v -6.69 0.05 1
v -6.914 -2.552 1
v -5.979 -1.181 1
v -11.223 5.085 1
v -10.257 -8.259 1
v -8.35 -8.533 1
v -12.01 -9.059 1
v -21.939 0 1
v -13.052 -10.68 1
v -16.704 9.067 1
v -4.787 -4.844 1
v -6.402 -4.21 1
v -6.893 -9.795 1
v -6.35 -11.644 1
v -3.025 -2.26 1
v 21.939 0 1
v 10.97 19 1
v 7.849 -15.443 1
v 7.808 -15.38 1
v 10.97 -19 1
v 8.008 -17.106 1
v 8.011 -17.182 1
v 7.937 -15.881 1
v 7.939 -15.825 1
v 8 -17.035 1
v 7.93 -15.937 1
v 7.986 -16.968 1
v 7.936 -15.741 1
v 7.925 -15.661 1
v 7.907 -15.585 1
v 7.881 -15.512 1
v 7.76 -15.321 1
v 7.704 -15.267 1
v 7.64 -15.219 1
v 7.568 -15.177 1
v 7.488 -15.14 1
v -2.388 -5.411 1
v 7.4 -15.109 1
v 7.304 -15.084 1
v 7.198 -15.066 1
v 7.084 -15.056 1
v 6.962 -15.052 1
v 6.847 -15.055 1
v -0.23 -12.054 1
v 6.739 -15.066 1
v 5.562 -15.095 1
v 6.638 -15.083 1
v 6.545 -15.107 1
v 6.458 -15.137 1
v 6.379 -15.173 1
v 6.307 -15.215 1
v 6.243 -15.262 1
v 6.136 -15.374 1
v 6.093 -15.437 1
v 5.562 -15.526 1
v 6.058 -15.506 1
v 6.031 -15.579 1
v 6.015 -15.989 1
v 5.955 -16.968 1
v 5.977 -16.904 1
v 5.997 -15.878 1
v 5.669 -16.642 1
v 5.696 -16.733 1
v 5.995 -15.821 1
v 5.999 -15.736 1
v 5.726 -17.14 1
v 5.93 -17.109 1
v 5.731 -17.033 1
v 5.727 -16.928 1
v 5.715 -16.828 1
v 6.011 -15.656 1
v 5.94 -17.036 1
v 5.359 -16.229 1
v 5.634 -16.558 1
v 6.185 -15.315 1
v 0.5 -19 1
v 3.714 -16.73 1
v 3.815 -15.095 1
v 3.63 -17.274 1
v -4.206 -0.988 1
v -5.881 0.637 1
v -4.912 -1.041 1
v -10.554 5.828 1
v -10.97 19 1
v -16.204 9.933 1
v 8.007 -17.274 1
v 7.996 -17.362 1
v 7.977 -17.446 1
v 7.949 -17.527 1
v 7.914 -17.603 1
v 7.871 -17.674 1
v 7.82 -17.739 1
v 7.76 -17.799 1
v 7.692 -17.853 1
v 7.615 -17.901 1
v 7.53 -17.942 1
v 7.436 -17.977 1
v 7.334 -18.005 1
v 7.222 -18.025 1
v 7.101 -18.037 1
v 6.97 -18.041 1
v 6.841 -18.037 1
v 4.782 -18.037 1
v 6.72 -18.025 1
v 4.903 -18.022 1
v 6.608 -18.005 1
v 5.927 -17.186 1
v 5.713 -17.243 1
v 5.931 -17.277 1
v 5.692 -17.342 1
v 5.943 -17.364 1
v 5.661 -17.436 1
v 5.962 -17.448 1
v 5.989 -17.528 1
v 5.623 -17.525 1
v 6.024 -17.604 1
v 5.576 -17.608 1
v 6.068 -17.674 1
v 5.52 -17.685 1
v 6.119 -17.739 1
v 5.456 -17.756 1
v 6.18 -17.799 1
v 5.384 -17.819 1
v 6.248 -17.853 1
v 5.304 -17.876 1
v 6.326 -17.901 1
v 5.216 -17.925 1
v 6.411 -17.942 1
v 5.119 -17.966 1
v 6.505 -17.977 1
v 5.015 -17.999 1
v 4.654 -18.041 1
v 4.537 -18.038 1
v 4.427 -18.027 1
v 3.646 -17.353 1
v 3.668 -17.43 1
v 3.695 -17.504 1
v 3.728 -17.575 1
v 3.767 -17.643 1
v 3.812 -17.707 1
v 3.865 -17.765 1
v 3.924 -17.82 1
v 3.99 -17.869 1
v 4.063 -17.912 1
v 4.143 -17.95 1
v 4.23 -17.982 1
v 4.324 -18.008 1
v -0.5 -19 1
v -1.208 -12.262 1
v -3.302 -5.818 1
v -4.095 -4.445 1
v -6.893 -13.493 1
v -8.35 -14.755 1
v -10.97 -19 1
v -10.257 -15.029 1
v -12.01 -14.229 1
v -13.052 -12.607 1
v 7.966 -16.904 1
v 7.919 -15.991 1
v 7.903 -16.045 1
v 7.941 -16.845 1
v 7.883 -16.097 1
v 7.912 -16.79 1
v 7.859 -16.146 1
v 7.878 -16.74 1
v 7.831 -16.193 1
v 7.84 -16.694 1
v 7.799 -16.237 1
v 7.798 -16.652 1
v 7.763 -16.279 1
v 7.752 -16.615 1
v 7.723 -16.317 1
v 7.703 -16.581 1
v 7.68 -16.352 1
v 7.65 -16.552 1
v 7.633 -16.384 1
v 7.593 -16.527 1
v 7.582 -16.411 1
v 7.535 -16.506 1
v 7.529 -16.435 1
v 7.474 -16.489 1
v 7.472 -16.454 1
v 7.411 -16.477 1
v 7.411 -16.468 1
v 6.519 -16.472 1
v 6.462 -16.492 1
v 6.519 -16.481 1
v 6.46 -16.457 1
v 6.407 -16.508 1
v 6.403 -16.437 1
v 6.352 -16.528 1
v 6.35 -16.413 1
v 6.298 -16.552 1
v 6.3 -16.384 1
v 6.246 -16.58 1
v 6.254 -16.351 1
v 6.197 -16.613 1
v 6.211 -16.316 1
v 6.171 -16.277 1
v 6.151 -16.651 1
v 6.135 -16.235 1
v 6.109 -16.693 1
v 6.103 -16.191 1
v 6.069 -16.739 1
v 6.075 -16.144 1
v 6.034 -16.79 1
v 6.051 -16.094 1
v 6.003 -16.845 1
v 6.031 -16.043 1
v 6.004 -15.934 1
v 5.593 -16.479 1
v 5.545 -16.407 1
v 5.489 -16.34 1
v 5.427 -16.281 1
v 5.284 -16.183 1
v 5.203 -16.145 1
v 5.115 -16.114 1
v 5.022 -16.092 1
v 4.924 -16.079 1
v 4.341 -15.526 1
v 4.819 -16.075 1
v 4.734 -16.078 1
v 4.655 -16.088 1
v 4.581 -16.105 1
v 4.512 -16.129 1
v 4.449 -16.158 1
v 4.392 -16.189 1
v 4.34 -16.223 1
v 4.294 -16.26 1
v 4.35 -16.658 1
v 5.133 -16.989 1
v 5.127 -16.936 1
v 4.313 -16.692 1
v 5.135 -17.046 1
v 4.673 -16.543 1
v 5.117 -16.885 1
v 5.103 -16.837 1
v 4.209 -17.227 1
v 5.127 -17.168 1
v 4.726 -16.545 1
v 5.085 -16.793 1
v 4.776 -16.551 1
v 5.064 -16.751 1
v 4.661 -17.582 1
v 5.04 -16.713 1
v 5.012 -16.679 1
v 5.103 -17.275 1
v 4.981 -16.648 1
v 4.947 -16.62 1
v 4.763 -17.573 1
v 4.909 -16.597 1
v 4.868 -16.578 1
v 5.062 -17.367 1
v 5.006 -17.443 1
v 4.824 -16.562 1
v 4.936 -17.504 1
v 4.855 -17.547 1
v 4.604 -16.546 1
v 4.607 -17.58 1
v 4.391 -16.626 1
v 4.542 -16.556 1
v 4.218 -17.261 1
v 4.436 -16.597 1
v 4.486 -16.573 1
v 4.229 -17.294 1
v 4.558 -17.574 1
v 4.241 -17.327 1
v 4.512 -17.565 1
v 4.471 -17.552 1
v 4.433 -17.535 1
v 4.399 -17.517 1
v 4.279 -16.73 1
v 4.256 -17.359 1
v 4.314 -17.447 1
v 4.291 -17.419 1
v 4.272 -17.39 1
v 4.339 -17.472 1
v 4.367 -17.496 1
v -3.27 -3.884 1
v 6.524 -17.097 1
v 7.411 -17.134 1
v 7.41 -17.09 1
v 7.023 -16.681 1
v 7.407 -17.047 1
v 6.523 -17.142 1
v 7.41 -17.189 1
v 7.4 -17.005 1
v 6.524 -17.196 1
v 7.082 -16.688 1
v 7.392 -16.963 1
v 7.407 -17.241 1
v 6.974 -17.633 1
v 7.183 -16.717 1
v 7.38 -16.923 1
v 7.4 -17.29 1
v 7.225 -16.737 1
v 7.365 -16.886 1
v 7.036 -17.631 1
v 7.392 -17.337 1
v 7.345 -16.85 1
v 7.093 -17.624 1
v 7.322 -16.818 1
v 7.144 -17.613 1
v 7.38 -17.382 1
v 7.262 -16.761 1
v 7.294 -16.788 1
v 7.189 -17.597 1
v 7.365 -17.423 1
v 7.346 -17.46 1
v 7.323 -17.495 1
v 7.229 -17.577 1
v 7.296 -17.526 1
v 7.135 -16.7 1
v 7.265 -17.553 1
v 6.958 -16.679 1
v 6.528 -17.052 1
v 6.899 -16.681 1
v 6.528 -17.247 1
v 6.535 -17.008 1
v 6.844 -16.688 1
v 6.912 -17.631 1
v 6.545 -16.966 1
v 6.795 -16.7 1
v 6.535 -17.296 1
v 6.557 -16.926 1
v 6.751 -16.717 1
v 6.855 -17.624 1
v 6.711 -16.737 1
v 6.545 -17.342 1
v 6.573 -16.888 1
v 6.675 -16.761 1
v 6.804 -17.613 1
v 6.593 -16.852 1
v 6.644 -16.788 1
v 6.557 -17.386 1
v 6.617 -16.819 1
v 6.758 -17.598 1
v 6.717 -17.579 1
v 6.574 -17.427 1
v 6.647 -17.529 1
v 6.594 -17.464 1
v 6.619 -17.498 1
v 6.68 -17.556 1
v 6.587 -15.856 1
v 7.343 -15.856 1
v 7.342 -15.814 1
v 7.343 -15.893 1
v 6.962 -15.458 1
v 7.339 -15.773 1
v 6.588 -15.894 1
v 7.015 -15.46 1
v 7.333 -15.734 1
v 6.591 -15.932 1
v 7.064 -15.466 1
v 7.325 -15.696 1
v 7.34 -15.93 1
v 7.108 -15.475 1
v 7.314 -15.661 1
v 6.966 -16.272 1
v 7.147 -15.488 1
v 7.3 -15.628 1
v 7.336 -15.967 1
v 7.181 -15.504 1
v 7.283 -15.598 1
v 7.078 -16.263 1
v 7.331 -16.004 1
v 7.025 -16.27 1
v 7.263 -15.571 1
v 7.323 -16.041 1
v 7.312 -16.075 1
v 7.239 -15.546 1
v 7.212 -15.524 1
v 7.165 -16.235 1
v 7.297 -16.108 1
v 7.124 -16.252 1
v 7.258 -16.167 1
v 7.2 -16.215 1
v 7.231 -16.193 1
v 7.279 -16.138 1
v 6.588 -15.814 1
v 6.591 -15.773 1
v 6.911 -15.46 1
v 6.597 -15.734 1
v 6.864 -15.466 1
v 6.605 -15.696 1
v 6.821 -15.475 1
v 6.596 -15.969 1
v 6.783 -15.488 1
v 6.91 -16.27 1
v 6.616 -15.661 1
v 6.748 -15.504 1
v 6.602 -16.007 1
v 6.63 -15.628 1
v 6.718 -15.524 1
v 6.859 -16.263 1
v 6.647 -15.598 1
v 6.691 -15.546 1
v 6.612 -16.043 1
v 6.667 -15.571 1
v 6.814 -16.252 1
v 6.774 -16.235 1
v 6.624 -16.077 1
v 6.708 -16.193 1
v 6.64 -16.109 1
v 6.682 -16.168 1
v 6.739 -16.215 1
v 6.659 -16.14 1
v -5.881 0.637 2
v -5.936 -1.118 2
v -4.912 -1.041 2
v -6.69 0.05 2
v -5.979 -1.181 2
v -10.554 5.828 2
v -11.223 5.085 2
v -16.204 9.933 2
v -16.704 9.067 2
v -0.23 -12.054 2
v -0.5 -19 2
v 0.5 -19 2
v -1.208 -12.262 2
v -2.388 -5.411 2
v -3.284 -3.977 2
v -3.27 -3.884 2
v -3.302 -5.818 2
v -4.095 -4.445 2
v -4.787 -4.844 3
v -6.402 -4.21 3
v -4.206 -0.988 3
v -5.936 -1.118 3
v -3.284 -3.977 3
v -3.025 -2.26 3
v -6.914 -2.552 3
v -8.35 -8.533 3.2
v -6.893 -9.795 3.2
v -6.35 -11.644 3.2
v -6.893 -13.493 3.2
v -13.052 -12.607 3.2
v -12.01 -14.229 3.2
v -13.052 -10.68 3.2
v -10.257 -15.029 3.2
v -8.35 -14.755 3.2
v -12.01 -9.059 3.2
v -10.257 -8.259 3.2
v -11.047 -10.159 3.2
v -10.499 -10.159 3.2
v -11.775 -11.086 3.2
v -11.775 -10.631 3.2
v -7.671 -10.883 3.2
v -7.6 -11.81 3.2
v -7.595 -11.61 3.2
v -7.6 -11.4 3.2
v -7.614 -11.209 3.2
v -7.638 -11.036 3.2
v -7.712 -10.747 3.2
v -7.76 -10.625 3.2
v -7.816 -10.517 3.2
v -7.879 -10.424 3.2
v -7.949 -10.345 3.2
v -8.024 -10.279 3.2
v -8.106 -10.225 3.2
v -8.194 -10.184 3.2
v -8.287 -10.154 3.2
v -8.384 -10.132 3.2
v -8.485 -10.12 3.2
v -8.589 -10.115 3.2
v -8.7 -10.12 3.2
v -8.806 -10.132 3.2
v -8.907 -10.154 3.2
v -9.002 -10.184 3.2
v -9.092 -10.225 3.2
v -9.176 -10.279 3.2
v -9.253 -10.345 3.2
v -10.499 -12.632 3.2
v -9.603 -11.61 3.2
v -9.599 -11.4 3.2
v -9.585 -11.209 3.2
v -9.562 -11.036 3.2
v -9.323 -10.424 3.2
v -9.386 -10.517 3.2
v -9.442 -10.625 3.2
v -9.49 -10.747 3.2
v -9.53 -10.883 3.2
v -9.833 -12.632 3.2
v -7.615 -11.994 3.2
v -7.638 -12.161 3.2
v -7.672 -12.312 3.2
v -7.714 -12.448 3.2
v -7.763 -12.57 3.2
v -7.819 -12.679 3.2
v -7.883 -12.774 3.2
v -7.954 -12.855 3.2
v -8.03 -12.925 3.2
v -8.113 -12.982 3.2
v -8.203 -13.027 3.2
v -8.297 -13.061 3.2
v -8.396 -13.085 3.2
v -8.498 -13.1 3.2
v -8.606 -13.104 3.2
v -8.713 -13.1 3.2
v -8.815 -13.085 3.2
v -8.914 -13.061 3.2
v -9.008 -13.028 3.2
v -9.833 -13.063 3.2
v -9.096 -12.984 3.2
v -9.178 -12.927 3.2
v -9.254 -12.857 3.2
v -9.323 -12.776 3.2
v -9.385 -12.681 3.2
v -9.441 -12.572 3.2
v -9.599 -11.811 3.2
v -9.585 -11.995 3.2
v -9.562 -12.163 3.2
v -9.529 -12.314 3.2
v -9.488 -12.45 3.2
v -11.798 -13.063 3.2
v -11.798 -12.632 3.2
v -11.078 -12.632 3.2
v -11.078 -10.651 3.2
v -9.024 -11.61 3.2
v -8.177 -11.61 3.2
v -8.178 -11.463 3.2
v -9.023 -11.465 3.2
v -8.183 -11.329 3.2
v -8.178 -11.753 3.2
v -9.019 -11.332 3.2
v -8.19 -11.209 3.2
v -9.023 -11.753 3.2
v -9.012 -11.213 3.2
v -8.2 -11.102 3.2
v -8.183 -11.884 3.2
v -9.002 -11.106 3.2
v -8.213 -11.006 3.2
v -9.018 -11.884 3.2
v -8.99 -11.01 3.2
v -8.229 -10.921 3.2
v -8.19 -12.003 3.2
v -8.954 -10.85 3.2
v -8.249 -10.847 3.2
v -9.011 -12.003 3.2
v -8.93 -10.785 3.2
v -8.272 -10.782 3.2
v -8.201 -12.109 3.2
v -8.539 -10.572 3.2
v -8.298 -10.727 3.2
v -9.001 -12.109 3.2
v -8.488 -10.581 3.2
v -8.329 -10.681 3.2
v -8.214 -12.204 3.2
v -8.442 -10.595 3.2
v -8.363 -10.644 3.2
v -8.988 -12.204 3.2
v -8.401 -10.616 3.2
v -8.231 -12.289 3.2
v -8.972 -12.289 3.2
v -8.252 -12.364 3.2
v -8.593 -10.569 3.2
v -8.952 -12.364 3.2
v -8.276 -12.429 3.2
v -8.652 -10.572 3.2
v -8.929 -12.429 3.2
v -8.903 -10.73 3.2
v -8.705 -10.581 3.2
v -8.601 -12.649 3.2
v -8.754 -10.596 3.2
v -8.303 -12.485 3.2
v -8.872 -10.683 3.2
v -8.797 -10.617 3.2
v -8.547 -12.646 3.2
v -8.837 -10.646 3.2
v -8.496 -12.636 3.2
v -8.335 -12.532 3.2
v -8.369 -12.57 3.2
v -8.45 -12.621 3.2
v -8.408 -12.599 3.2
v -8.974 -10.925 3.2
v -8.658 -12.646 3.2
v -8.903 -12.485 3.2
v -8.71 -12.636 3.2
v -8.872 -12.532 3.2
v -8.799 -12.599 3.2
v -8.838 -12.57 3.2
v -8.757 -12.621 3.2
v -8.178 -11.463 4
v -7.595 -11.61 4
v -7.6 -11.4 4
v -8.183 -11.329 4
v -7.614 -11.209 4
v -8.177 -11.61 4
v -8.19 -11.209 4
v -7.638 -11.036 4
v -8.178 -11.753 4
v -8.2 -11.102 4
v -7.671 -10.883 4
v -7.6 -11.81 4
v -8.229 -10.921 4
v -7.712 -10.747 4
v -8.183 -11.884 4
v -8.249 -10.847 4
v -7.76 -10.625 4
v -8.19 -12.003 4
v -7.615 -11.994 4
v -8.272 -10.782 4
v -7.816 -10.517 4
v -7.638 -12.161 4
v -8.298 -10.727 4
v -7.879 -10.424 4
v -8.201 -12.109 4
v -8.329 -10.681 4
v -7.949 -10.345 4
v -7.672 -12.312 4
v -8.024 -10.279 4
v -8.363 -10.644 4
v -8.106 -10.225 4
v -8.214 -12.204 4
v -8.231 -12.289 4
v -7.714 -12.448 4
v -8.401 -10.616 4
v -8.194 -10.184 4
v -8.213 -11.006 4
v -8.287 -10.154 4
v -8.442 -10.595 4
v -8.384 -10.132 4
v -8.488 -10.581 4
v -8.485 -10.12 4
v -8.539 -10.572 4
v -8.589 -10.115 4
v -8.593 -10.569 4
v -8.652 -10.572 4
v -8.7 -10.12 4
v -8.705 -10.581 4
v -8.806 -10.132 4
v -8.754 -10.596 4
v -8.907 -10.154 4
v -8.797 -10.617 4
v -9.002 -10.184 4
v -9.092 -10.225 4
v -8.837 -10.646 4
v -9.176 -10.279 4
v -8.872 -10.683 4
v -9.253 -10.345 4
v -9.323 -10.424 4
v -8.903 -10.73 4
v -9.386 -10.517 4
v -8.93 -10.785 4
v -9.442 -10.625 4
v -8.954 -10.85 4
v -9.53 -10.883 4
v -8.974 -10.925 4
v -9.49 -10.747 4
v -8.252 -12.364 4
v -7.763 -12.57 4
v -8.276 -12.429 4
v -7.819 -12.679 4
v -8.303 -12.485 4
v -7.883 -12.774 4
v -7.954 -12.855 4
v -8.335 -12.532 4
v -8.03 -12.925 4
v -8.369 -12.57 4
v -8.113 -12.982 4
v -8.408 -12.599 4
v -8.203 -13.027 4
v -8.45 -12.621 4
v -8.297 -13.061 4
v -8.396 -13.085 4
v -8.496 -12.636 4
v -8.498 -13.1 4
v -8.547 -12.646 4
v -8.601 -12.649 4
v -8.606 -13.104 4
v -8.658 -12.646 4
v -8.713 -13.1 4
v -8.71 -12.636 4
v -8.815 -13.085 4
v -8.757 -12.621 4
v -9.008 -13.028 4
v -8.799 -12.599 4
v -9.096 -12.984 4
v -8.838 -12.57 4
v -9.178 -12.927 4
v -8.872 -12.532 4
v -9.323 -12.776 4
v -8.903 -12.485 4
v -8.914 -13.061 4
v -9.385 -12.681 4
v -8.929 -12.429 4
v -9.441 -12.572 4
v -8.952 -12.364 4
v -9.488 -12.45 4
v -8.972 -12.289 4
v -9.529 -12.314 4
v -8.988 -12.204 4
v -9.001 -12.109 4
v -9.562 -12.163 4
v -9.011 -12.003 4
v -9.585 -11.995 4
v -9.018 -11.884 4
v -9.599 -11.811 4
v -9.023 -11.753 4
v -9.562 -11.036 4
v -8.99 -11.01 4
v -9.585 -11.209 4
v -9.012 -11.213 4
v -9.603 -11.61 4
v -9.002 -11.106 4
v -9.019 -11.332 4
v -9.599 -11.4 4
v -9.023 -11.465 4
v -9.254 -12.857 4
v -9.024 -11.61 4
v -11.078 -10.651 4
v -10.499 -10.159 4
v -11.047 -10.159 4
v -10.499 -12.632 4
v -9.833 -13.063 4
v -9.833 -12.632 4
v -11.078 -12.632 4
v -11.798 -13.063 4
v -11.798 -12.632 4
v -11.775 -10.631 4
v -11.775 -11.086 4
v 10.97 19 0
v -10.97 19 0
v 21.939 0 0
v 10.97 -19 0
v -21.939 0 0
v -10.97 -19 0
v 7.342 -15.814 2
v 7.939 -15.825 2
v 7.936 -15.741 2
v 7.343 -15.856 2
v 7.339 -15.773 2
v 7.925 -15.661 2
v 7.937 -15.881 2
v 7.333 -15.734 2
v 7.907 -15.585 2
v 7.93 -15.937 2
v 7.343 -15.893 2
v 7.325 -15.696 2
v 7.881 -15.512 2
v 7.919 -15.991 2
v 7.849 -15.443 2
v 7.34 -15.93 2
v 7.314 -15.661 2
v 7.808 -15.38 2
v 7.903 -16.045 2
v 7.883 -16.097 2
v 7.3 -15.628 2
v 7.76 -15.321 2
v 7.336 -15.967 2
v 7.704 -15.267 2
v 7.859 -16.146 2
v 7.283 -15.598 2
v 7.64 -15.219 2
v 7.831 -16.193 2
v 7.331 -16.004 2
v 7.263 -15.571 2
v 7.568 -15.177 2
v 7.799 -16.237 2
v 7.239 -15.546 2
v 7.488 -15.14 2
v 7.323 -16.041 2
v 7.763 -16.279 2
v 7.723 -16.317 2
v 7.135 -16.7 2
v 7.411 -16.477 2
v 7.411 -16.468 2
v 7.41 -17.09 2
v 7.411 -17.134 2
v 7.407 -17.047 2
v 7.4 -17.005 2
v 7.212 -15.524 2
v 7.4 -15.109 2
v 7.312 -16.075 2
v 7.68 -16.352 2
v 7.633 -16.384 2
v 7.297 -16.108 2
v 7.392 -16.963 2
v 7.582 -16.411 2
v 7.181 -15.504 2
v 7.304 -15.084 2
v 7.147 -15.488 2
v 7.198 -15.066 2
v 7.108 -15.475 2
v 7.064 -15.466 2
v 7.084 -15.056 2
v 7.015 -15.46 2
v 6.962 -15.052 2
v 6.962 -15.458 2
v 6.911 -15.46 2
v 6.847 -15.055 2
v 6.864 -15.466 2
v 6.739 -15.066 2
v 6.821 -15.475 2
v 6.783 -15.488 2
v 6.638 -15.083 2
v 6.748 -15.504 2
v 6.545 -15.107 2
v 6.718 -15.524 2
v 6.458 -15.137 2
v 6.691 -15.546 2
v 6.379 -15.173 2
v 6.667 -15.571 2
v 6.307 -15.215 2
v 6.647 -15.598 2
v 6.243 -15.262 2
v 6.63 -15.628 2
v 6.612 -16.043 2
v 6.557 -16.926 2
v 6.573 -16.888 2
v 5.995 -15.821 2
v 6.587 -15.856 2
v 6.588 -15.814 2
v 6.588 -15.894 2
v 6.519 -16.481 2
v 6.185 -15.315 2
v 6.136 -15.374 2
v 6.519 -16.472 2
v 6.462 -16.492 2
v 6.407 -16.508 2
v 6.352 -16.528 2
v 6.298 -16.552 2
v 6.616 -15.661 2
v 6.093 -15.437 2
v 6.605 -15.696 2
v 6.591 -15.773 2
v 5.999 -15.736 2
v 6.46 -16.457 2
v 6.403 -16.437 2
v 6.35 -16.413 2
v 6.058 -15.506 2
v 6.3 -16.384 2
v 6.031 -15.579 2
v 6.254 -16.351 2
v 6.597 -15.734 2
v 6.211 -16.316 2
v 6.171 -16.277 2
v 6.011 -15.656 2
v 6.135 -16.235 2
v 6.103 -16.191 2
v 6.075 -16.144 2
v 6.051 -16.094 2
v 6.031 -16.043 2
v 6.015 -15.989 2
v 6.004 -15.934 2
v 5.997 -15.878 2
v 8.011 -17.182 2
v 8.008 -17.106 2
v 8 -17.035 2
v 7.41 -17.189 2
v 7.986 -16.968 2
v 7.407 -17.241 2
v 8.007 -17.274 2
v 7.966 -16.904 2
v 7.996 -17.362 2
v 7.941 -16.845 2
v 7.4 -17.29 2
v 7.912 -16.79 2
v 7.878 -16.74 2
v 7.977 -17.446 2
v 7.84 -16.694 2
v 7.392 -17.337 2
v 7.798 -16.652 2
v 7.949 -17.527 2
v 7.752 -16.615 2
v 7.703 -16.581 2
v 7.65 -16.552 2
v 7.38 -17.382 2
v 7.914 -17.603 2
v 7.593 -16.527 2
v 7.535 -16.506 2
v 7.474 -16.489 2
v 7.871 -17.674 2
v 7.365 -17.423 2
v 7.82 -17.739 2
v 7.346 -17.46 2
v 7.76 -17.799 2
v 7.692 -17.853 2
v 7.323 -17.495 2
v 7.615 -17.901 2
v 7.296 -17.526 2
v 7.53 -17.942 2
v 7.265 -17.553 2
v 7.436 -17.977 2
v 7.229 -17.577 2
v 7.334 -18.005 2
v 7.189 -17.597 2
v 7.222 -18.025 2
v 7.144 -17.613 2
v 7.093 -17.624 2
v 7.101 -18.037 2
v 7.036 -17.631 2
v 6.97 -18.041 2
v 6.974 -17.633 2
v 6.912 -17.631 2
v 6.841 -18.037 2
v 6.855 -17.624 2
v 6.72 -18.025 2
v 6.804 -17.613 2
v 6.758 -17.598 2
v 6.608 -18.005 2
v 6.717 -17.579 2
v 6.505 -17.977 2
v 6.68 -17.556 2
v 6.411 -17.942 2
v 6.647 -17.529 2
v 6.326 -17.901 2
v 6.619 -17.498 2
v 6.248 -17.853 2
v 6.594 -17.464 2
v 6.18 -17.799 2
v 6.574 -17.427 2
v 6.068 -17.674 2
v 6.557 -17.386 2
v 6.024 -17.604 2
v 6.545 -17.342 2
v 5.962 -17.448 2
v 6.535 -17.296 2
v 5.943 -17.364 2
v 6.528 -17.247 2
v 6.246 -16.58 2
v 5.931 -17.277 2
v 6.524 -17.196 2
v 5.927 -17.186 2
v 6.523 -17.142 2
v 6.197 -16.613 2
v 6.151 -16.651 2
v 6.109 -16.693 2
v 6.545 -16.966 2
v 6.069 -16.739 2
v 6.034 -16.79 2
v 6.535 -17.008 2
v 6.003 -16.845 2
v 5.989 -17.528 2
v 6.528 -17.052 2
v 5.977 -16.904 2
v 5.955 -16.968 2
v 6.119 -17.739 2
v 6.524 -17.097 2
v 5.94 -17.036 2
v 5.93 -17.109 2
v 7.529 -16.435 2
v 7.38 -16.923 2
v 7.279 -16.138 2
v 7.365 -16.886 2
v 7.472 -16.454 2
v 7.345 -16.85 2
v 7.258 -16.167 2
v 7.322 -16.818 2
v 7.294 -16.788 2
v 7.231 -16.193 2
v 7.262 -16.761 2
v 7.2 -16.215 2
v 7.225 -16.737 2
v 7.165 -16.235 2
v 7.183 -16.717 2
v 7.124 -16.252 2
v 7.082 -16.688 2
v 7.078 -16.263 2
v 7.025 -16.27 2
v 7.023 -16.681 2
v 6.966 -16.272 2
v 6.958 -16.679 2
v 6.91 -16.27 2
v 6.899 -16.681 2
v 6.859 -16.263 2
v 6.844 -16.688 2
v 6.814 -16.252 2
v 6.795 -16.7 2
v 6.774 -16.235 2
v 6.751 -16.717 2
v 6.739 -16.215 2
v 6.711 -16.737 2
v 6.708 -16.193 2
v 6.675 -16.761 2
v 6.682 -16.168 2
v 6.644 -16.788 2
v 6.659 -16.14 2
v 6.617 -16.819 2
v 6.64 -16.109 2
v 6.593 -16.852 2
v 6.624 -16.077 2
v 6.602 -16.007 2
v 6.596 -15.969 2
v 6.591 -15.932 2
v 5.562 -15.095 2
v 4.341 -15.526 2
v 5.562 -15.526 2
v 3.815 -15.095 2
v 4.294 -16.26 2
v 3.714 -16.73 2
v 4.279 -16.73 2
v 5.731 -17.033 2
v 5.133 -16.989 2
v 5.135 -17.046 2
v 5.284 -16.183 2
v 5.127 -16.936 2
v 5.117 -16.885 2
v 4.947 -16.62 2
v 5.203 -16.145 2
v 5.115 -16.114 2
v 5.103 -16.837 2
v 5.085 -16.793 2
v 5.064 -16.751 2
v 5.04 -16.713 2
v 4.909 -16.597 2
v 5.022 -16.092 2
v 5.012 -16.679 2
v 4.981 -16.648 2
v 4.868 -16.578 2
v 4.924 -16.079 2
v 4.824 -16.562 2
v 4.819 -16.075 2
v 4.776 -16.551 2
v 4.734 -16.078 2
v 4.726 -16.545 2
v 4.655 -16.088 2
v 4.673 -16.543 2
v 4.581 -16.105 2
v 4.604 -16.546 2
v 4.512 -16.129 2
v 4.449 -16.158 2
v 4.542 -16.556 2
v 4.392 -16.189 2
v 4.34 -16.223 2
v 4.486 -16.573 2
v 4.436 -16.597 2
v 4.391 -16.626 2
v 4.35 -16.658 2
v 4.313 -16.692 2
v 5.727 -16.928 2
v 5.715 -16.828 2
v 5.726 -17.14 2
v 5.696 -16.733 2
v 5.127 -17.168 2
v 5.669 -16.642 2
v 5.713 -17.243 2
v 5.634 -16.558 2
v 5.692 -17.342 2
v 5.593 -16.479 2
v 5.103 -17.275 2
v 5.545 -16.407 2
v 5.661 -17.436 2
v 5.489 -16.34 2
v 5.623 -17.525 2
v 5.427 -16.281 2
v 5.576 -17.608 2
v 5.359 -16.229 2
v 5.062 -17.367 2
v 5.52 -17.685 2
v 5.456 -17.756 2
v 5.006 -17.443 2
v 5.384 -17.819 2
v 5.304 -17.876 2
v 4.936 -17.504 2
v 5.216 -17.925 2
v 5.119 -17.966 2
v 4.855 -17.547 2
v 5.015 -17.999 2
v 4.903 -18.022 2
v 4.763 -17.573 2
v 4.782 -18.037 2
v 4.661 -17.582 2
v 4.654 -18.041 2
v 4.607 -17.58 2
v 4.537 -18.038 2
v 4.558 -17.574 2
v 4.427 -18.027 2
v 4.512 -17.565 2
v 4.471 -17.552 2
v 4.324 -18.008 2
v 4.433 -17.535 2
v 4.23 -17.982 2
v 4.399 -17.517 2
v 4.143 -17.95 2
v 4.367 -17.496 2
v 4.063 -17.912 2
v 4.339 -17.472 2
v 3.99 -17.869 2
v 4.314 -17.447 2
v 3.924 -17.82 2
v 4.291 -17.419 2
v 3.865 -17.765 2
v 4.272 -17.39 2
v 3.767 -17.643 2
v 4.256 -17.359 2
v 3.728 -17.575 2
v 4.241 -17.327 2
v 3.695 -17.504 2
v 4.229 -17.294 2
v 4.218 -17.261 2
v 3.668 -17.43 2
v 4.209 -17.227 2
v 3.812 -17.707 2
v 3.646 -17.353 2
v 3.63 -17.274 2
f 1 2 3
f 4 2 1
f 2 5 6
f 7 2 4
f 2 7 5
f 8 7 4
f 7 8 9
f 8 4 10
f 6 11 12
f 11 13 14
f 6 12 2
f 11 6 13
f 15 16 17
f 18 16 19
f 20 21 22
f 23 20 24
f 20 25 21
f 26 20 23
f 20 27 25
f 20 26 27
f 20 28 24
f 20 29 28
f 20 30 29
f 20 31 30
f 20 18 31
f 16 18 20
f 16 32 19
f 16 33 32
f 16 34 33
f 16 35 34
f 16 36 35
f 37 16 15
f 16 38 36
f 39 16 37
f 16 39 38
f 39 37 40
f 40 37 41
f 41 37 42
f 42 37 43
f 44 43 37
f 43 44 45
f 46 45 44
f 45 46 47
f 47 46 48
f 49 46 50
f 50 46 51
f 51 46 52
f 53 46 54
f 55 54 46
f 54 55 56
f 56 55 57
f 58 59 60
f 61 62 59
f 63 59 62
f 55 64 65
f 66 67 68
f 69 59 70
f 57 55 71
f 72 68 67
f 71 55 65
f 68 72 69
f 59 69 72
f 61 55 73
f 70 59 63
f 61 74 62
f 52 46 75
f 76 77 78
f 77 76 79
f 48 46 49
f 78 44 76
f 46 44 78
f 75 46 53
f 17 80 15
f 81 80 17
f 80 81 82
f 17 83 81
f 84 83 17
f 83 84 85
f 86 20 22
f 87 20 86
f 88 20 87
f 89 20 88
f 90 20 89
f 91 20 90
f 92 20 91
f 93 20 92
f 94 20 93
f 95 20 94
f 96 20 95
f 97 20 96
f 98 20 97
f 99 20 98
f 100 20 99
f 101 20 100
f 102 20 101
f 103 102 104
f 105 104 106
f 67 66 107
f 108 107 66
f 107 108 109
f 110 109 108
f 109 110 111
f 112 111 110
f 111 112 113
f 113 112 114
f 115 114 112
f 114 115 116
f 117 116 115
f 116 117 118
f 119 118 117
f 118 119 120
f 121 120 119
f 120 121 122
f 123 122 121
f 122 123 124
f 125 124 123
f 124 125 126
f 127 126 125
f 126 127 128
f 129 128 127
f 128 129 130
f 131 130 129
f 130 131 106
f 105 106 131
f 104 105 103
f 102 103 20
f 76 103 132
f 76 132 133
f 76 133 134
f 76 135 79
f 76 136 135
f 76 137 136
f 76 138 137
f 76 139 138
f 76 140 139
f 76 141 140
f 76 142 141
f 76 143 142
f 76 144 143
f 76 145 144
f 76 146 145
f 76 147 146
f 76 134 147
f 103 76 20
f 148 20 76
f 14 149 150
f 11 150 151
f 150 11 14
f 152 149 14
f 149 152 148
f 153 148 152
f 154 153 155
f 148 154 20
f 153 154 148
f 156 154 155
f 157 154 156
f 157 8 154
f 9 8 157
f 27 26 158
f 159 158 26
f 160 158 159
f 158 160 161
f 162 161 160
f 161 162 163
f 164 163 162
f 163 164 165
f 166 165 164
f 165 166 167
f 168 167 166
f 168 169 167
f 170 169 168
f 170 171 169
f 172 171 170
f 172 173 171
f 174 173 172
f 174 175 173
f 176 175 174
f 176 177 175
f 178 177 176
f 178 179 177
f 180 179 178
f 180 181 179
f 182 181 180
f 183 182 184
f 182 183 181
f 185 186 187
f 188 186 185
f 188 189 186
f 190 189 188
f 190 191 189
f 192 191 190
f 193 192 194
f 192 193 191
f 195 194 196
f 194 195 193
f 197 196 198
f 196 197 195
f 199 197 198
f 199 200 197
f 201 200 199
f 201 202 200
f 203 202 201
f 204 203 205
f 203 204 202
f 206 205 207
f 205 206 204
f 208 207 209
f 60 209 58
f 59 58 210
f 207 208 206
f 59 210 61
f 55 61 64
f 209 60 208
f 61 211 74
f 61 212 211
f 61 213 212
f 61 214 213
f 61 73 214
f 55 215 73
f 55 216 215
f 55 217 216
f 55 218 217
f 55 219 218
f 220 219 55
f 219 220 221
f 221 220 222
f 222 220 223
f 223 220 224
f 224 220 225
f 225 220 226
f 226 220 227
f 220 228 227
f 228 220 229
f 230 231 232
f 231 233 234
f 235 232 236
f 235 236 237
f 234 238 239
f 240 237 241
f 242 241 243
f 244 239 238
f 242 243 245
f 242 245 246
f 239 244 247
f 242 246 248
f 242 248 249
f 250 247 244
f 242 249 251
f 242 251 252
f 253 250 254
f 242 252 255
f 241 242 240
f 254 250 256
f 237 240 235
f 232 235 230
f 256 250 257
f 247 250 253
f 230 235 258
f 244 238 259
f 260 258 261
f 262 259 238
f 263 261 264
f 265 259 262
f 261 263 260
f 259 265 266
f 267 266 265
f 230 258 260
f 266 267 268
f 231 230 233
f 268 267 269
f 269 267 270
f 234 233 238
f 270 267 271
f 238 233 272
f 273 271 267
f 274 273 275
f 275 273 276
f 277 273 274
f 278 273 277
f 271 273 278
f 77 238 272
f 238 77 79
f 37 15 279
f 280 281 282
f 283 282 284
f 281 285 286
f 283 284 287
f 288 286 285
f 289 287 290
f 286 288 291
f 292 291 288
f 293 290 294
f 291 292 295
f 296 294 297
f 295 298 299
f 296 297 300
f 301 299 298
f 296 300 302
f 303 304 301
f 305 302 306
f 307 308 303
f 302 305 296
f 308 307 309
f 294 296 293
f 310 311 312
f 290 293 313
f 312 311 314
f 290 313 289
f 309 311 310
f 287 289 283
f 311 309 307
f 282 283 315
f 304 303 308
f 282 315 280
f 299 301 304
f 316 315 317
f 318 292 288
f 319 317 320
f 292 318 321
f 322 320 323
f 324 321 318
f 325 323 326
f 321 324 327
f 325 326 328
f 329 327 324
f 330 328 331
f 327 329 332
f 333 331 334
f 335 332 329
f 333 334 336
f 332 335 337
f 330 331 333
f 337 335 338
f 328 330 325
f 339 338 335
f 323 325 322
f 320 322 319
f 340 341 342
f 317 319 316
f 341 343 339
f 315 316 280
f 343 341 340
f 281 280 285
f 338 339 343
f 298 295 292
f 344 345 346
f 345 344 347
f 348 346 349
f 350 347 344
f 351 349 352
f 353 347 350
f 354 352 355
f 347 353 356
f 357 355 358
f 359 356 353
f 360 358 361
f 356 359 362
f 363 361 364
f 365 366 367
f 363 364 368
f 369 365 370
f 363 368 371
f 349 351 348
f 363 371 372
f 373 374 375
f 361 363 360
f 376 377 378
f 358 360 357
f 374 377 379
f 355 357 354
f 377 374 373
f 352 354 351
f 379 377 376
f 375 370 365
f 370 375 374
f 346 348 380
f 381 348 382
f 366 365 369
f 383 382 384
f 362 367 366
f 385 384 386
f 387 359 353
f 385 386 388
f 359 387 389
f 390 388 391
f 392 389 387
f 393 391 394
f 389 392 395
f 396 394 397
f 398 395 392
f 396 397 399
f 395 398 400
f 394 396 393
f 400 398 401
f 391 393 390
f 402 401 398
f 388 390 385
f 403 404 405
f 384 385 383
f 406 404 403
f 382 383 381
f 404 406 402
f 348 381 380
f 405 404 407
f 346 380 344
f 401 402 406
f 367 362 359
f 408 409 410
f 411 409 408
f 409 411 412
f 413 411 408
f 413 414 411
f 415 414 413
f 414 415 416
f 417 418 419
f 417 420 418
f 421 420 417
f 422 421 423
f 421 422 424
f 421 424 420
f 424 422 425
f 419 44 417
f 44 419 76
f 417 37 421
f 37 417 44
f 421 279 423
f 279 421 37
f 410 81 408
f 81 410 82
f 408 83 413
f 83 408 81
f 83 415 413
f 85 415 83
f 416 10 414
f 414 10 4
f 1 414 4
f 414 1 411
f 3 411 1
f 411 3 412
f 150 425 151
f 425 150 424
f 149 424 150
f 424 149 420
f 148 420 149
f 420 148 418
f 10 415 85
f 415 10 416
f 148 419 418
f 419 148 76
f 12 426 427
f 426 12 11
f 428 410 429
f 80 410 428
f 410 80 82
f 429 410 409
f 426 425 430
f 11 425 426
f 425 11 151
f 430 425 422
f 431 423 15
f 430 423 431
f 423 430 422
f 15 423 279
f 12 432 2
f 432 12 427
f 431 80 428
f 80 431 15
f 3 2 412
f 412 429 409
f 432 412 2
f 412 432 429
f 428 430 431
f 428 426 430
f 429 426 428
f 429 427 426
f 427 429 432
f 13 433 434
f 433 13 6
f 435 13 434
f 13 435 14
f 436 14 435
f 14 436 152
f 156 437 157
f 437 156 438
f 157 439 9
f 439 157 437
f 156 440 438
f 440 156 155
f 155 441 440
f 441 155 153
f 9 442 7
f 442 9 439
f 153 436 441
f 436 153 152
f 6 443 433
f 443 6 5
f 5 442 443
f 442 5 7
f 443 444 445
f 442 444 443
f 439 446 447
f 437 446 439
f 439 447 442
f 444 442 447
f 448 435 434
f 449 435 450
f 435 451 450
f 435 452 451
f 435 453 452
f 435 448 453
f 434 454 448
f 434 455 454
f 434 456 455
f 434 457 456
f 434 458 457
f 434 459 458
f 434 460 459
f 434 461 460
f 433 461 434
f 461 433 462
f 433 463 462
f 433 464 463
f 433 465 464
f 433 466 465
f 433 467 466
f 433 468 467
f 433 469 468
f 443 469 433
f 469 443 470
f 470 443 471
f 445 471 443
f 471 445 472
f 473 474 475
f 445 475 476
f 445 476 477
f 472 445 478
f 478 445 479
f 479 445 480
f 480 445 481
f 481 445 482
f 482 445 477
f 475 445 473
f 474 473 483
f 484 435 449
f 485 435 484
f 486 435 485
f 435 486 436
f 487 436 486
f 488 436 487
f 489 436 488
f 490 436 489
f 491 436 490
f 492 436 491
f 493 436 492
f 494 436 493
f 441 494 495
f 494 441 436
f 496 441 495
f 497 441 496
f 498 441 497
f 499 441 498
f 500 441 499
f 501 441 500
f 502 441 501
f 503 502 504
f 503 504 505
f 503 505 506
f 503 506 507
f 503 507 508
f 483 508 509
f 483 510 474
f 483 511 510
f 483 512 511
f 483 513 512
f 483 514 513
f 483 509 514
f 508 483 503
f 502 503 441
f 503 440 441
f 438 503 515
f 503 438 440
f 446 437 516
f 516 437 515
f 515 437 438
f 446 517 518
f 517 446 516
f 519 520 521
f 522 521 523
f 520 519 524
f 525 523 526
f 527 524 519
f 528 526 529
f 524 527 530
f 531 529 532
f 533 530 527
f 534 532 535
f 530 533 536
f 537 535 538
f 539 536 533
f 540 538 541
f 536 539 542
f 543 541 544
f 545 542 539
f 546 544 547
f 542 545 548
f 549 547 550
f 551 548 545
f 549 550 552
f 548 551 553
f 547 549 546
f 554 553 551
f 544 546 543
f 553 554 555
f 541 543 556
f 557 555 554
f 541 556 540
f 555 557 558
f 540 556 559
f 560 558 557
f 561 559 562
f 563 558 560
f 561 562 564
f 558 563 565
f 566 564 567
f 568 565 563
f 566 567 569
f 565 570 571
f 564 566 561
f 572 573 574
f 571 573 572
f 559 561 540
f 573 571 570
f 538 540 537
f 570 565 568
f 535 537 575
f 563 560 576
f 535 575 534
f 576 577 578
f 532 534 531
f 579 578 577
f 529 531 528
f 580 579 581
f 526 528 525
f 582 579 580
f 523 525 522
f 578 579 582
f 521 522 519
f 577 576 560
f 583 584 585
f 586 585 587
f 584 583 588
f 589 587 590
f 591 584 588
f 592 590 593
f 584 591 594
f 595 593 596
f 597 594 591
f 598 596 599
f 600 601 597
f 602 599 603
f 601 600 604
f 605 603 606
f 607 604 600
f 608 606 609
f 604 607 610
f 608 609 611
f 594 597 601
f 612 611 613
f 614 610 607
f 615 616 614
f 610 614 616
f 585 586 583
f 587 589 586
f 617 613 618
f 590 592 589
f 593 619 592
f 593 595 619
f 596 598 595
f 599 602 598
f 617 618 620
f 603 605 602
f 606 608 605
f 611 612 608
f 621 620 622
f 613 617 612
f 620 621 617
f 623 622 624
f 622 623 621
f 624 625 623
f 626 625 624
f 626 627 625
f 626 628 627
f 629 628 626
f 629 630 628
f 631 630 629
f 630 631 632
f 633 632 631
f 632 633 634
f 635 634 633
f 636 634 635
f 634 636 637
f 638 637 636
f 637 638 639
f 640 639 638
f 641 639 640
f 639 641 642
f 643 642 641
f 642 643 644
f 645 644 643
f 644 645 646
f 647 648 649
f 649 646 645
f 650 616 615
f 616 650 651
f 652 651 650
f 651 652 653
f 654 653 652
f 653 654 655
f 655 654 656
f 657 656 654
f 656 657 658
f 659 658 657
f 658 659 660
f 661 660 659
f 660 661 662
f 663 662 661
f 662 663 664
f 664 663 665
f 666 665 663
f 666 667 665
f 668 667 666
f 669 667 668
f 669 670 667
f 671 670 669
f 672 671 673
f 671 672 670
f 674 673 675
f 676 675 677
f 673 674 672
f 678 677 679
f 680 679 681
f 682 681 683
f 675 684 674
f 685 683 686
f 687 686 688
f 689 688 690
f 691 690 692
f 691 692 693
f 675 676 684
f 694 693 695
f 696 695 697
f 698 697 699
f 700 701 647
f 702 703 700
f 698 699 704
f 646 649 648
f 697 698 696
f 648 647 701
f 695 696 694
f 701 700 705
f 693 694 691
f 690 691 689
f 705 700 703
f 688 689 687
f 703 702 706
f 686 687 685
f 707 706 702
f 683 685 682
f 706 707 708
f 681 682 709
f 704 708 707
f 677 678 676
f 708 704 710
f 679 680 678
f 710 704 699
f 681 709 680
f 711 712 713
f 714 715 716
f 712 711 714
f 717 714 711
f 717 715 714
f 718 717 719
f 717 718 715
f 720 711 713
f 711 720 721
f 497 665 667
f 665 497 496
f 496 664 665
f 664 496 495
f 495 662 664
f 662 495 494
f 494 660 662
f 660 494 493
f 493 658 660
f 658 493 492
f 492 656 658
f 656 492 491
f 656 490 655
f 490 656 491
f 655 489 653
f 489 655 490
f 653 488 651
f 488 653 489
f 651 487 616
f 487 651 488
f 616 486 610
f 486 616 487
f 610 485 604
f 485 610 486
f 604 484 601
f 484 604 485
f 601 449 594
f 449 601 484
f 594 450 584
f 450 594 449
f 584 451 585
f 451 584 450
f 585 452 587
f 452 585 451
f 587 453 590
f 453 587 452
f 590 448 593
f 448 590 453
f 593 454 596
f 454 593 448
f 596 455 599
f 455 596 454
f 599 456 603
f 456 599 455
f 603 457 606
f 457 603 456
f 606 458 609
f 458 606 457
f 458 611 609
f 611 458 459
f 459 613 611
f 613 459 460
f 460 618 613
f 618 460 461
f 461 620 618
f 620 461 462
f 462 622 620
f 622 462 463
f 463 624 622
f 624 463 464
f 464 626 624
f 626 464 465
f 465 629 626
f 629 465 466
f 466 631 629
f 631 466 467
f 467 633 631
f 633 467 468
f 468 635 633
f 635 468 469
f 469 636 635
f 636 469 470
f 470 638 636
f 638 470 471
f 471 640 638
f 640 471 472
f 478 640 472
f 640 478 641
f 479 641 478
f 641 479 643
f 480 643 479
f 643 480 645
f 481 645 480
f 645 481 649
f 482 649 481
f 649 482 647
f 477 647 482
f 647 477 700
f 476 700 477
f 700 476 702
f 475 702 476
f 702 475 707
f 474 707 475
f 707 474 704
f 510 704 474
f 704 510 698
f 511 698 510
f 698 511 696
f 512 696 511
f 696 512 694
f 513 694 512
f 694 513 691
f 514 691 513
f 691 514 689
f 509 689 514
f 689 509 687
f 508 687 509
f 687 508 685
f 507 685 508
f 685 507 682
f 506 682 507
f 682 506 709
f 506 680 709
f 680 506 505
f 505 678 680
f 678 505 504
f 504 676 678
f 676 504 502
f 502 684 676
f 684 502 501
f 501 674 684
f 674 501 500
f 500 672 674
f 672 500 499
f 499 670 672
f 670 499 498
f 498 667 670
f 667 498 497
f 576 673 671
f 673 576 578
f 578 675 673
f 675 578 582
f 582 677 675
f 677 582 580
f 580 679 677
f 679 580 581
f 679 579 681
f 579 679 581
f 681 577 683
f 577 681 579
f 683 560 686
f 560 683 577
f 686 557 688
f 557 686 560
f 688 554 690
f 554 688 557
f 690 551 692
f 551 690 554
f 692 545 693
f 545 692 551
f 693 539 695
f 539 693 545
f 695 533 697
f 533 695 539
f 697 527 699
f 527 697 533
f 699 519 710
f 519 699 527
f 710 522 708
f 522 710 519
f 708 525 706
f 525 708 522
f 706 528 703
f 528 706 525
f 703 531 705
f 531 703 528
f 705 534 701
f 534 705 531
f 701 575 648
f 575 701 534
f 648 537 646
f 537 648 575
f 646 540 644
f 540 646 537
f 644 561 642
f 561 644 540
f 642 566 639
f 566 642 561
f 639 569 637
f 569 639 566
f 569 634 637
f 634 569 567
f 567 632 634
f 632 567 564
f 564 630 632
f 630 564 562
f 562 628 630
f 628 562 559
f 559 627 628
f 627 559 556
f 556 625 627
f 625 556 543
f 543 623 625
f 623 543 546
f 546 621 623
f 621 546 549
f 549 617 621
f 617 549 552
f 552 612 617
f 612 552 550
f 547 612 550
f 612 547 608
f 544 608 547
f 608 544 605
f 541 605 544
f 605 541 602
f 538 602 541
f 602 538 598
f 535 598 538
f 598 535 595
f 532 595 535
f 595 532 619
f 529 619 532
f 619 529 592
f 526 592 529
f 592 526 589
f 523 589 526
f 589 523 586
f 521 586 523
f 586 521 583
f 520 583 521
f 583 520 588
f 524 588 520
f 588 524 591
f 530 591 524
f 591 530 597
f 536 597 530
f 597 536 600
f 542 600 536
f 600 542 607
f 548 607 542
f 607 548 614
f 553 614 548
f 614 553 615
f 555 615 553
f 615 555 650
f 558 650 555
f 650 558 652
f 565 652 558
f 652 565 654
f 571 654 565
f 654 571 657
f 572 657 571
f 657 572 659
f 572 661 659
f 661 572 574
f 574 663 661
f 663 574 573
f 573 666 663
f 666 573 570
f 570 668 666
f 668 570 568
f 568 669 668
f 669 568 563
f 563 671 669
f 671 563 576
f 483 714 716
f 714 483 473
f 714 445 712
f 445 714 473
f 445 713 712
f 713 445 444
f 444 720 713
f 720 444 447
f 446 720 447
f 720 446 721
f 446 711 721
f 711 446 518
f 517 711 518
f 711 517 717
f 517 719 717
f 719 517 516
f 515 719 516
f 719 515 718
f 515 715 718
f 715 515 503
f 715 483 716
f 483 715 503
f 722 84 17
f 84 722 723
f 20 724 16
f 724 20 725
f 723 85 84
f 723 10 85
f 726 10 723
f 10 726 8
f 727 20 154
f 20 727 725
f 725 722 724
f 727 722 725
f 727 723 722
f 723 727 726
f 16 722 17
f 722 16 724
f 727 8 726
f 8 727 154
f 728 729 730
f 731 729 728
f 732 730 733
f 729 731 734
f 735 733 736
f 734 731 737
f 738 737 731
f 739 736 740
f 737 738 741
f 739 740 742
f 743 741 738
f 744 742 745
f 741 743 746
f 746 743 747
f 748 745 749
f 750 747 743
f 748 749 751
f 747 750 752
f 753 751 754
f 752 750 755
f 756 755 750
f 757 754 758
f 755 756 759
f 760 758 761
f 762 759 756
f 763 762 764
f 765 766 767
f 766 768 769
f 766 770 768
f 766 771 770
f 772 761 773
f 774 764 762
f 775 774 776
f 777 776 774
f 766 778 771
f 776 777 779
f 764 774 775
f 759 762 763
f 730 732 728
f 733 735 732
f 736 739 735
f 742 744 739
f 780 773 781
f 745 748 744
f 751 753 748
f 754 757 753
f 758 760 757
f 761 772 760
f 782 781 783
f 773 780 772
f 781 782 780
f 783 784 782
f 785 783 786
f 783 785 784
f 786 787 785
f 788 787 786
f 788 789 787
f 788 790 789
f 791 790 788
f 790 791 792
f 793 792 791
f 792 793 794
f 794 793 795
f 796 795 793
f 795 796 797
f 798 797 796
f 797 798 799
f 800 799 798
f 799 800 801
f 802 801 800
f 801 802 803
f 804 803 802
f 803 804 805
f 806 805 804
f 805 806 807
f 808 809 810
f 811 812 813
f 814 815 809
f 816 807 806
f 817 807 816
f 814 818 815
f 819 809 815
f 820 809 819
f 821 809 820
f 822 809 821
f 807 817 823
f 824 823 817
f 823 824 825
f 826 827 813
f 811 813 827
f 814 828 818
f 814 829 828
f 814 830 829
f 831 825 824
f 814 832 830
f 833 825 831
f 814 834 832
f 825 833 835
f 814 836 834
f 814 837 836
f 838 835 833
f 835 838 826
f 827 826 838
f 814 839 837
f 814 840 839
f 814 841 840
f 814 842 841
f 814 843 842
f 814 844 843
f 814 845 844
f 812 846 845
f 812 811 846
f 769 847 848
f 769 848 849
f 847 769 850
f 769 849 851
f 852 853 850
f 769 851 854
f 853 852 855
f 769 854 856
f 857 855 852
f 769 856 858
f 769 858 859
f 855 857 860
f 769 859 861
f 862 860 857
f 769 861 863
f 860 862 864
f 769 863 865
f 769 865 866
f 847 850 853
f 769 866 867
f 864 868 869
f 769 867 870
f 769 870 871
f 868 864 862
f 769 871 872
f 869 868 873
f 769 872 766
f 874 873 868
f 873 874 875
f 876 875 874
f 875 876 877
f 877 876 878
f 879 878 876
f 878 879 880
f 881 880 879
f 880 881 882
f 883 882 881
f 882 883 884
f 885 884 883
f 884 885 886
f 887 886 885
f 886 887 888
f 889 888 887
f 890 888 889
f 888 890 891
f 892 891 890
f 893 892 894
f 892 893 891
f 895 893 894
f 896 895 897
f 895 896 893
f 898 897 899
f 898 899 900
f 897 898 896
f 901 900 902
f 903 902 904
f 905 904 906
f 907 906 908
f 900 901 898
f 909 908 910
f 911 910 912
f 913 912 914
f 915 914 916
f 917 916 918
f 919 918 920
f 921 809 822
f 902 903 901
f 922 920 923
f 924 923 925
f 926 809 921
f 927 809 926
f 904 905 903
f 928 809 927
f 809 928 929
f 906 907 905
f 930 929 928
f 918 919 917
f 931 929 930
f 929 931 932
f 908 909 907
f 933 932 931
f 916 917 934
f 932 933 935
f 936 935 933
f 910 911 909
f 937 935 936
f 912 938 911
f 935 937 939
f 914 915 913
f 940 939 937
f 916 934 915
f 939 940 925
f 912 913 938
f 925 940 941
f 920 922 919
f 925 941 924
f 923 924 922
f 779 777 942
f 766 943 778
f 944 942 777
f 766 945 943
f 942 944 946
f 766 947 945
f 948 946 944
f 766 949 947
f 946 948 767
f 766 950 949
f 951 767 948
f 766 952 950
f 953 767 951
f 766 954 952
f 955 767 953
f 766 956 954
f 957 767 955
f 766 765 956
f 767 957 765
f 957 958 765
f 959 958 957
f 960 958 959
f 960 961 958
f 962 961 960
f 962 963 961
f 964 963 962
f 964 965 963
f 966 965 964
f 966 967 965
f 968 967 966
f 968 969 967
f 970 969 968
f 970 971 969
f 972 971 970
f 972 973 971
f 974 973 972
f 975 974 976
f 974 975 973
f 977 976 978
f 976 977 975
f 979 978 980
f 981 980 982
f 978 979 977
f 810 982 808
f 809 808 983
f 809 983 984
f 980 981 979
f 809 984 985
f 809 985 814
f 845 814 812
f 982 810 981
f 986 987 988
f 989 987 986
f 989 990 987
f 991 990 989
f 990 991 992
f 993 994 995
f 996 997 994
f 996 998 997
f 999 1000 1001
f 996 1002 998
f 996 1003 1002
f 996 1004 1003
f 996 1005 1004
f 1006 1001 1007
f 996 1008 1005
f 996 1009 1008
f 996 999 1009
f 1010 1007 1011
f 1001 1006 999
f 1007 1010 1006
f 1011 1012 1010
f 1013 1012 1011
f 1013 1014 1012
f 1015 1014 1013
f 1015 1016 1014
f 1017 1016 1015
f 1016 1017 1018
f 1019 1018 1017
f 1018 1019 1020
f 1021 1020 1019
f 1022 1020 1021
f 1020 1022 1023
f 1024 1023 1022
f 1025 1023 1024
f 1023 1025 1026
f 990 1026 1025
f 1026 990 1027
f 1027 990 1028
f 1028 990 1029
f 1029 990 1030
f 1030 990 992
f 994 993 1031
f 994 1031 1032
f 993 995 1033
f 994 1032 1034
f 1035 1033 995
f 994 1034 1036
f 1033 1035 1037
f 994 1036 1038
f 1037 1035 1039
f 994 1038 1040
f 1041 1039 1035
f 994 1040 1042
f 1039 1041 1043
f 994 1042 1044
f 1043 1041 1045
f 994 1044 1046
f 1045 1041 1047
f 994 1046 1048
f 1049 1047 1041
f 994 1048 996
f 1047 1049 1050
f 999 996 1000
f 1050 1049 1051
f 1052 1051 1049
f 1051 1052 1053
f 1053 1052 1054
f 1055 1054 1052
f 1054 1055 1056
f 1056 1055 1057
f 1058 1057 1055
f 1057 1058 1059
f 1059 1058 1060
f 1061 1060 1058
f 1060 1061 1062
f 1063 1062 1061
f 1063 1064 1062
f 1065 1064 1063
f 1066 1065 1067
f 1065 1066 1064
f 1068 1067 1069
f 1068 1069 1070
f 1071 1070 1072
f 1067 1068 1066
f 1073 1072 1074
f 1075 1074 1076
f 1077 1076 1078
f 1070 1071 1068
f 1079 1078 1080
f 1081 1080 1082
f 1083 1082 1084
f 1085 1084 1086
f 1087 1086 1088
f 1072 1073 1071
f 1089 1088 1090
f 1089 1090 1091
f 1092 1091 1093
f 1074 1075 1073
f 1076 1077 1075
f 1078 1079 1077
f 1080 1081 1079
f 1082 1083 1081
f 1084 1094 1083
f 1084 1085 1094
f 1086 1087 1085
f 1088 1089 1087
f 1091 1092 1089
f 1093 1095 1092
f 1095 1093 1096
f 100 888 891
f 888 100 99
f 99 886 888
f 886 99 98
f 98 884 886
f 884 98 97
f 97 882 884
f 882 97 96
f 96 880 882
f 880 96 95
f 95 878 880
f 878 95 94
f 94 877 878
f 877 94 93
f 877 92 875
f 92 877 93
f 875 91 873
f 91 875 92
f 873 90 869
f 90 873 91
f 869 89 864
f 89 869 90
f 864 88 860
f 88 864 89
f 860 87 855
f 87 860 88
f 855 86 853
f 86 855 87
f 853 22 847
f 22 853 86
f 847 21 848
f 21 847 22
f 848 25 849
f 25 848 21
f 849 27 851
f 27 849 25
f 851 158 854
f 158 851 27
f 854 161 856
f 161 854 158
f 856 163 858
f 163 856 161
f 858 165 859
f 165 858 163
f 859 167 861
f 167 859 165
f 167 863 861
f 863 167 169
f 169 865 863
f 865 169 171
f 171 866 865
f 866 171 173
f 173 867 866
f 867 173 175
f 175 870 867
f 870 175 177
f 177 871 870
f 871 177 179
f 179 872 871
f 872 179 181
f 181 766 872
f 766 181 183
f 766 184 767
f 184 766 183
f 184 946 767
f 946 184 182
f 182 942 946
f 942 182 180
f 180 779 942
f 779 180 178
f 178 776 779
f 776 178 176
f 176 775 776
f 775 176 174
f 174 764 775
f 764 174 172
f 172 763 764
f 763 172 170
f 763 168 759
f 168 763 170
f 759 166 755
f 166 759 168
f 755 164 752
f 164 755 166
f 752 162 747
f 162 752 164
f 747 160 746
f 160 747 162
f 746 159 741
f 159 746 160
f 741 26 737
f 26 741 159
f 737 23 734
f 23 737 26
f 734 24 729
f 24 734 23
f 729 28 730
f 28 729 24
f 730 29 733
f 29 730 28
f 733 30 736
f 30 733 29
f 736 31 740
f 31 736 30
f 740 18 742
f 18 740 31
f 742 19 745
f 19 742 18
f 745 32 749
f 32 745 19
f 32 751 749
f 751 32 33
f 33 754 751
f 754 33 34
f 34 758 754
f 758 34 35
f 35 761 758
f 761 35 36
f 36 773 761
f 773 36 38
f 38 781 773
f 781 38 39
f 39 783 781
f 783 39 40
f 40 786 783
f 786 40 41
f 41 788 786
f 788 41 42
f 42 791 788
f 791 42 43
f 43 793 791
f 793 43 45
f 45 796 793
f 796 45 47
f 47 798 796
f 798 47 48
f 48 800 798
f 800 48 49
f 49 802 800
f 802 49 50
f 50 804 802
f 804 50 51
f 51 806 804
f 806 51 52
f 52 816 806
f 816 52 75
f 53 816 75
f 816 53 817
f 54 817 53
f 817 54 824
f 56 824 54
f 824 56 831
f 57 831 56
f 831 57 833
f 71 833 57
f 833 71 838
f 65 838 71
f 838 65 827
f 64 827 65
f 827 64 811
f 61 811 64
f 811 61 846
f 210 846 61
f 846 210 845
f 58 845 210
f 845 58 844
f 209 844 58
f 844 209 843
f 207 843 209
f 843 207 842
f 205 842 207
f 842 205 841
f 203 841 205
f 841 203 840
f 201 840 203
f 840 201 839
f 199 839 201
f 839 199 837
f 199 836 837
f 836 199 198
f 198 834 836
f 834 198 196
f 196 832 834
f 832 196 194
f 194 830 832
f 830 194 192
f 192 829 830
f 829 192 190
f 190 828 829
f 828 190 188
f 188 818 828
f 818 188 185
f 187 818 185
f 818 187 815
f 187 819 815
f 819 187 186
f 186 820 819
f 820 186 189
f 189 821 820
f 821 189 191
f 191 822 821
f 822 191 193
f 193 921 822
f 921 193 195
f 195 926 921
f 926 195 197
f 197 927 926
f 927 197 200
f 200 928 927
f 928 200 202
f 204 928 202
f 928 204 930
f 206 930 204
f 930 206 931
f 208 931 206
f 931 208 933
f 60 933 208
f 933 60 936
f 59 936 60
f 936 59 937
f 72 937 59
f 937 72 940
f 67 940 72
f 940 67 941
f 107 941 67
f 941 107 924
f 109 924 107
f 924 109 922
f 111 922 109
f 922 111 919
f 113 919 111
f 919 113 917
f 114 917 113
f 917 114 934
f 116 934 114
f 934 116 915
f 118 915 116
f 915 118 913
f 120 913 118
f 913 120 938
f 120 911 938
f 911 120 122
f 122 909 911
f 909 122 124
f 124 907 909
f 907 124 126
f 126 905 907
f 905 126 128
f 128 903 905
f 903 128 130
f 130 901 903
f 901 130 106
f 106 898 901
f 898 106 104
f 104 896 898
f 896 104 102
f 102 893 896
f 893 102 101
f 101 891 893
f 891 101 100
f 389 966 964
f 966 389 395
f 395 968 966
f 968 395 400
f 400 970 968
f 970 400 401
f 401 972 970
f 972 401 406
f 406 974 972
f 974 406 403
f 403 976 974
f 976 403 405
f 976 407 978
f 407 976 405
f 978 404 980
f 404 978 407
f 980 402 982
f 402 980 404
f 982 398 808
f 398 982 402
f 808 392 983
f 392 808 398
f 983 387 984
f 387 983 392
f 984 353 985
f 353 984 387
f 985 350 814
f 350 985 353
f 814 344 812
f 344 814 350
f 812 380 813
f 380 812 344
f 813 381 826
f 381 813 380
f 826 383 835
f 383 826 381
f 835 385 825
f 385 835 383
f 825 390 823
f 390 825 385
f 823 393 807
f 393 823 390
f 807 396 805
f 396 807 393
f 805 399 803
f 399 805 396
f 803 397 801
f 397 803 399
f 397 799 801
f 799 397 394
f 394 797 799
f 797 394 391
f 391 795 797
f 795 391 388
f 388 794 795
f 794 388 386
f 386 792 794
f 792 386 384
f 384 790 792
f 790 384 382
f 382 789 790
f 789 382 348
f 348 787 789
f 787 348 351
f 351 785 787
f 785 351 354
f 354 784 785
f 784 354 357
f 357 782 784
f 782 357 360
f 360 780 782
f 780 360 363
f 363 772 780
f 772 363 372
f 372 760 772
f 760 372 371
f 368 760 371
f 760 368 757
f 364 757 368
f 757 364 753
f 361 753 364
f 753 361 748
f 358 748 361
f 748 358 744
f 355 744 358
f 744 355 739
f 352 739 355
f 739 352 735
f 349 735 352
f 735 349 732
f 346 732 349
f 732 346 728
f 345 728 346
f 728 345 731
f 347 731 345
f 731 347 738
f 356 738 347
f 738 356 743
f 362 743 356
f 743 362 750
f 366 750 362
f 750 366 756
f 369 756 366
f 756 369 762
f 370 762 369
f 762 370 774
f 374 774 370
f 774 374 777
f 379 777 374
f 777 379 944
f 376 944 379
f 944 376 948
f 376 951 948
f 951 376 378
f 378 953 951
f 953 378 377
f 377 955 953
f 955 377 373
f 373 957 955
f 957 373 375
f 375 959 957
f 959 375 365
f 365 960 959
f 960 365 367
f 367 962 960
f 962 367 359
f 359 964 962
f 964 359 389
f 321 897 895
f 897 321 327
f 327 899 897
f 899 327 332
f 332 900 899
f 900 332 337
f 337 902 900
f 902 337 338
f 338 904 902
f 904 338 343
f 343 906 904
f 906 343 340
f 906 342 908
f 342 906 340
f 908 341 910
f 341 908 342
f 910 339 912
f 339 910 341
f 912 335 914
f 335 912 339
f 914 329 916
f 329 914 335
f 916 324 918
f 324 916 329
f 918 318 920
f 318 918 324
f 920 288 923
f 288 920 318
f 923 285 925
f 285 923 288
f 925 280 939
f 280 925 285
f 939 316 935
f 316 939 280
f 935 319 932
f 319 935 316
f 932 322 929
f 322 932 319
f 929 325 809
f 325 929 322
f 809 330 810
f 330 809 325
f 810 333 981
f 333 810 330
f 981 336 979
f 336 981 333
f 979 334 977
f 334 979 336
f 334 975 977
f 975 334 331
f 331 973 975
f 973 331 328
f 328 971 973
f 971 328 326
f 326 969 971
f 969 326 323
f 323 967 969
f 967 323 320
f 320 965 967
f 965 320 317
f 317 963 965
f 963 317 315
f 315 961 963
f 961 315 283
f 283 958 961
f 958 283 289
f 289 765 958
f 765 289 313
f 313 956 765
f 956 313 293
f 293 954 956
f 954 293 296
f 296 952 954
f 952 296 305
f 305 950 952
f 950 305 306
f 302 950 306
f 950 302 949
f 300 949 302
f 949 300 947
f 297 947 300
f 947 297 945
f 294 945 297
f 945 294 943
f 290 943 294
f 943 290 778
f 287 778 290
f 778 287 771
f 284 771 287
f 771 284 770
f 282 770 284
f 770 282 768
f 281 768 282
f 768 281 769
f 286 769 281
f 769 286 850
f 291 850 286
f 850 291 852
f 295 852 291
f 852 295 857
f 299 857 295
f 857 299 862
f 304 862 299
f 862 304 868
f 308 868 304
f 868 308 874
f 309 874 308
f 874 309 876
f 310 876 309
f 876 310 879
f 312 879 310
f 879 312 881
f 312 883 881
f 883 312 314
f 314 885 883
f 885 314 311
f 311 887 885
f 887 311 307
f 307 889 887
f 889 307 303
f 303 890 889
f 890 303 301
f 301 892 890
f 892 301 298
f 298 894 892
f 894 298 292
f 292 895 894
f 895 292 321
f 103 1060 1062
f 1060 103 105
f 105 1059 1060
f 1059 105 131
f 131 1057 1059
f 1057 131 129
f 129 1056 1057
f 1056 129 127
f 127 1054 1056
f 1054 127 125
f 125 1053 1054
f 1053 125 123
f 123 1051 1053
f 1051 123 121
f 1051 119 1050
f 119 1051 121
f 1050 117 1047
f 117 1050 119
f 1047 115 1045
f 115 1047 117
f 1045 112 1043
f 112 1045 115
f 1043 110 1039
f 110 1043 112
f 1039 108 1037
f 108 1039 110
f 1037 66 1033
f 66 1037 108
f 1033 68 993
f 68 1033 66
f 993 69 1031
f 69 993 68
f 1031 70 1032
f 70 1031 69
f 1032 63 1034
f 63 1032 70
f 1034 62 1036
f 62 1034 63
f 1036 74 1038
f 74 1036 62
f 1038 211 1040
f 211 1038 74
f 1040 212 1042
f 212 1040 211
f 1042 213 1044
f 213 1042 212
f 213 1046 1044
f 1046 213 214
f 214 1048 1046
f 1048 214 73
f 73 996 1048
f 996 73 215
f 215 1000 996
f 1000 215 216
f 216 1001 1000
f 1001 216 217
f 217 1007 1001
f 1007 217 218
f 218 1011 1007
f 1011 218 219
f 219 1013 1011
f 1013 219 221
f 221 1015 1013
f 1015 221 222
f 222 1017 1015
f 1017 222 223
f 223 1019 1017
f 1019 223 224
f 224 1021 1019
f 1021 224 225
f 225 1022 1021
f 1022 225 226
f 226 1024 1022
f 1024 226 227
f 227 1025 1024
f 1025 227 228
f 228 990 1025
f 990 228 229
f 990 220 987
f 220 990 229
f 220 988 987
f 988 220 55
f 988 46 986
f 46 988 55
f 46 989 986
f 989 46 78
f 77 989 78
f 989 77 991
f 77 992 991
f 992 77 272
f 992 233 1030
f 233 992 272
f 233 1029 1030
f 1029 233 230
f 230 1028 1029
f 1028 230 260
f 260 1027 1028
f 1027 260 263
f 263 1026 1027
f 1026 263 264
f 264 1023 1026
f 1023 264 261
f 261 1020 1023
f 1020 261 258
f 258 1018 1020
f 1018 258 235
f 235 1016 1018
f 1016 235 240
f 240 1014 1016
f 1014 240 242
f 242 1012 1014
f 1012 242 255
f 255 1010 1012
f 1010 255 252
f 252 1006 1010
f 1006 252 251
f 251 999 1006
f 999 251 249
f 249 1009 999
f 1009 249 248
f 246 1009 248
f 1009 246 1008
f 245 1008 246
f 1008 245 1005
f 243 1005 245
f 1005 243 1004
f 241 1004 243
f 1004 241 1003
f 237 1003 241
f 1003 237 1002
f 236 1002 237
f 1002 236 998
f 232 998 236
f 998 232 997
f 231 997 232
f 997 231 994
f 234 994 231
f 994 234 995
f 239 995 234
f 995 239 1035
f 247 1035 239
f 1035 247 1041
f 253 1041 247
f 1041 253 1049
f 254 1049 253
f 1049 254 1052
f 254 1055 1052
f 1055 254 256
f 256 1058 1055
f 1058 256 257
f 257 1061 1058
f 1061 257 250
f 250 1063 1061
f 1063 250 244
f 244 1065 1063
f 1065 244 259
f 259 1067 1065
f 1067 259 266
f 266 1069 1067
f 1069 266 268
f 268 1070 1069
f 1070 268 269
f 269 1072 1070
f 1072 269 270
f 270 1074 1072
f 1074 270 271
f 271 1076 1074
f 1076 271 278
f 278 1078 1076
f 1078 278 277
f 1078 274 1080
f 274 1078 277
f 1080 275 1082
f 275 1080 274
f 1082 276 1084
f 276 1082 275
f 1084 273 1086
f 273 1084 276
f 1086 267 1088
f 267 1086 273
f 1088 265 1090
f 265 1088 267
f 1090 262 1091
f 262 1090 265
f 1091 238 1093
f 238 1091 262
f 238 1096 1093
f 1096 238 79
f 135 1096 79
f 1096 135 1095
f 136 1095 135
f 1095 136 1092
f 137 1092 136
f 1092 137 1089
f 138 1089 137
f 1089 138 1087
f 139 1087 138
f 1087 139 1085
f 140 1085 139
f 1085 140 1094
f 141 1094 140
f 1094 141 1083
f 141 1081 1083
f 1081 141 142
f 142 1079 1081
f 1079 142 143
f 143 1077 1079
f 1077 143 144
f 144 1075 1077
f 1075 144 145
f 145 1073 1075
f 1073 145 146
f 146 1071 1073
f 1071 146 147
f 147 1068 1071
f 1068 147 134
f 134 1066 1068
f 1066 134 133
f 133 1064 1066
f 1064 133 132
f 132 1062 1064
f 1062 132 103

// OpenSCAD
include <../Scripts/18xx tiles basic functions.scad>
hex();
put_tilenr("58");
small_town_light_curve(4);
put_value("10",-140);
